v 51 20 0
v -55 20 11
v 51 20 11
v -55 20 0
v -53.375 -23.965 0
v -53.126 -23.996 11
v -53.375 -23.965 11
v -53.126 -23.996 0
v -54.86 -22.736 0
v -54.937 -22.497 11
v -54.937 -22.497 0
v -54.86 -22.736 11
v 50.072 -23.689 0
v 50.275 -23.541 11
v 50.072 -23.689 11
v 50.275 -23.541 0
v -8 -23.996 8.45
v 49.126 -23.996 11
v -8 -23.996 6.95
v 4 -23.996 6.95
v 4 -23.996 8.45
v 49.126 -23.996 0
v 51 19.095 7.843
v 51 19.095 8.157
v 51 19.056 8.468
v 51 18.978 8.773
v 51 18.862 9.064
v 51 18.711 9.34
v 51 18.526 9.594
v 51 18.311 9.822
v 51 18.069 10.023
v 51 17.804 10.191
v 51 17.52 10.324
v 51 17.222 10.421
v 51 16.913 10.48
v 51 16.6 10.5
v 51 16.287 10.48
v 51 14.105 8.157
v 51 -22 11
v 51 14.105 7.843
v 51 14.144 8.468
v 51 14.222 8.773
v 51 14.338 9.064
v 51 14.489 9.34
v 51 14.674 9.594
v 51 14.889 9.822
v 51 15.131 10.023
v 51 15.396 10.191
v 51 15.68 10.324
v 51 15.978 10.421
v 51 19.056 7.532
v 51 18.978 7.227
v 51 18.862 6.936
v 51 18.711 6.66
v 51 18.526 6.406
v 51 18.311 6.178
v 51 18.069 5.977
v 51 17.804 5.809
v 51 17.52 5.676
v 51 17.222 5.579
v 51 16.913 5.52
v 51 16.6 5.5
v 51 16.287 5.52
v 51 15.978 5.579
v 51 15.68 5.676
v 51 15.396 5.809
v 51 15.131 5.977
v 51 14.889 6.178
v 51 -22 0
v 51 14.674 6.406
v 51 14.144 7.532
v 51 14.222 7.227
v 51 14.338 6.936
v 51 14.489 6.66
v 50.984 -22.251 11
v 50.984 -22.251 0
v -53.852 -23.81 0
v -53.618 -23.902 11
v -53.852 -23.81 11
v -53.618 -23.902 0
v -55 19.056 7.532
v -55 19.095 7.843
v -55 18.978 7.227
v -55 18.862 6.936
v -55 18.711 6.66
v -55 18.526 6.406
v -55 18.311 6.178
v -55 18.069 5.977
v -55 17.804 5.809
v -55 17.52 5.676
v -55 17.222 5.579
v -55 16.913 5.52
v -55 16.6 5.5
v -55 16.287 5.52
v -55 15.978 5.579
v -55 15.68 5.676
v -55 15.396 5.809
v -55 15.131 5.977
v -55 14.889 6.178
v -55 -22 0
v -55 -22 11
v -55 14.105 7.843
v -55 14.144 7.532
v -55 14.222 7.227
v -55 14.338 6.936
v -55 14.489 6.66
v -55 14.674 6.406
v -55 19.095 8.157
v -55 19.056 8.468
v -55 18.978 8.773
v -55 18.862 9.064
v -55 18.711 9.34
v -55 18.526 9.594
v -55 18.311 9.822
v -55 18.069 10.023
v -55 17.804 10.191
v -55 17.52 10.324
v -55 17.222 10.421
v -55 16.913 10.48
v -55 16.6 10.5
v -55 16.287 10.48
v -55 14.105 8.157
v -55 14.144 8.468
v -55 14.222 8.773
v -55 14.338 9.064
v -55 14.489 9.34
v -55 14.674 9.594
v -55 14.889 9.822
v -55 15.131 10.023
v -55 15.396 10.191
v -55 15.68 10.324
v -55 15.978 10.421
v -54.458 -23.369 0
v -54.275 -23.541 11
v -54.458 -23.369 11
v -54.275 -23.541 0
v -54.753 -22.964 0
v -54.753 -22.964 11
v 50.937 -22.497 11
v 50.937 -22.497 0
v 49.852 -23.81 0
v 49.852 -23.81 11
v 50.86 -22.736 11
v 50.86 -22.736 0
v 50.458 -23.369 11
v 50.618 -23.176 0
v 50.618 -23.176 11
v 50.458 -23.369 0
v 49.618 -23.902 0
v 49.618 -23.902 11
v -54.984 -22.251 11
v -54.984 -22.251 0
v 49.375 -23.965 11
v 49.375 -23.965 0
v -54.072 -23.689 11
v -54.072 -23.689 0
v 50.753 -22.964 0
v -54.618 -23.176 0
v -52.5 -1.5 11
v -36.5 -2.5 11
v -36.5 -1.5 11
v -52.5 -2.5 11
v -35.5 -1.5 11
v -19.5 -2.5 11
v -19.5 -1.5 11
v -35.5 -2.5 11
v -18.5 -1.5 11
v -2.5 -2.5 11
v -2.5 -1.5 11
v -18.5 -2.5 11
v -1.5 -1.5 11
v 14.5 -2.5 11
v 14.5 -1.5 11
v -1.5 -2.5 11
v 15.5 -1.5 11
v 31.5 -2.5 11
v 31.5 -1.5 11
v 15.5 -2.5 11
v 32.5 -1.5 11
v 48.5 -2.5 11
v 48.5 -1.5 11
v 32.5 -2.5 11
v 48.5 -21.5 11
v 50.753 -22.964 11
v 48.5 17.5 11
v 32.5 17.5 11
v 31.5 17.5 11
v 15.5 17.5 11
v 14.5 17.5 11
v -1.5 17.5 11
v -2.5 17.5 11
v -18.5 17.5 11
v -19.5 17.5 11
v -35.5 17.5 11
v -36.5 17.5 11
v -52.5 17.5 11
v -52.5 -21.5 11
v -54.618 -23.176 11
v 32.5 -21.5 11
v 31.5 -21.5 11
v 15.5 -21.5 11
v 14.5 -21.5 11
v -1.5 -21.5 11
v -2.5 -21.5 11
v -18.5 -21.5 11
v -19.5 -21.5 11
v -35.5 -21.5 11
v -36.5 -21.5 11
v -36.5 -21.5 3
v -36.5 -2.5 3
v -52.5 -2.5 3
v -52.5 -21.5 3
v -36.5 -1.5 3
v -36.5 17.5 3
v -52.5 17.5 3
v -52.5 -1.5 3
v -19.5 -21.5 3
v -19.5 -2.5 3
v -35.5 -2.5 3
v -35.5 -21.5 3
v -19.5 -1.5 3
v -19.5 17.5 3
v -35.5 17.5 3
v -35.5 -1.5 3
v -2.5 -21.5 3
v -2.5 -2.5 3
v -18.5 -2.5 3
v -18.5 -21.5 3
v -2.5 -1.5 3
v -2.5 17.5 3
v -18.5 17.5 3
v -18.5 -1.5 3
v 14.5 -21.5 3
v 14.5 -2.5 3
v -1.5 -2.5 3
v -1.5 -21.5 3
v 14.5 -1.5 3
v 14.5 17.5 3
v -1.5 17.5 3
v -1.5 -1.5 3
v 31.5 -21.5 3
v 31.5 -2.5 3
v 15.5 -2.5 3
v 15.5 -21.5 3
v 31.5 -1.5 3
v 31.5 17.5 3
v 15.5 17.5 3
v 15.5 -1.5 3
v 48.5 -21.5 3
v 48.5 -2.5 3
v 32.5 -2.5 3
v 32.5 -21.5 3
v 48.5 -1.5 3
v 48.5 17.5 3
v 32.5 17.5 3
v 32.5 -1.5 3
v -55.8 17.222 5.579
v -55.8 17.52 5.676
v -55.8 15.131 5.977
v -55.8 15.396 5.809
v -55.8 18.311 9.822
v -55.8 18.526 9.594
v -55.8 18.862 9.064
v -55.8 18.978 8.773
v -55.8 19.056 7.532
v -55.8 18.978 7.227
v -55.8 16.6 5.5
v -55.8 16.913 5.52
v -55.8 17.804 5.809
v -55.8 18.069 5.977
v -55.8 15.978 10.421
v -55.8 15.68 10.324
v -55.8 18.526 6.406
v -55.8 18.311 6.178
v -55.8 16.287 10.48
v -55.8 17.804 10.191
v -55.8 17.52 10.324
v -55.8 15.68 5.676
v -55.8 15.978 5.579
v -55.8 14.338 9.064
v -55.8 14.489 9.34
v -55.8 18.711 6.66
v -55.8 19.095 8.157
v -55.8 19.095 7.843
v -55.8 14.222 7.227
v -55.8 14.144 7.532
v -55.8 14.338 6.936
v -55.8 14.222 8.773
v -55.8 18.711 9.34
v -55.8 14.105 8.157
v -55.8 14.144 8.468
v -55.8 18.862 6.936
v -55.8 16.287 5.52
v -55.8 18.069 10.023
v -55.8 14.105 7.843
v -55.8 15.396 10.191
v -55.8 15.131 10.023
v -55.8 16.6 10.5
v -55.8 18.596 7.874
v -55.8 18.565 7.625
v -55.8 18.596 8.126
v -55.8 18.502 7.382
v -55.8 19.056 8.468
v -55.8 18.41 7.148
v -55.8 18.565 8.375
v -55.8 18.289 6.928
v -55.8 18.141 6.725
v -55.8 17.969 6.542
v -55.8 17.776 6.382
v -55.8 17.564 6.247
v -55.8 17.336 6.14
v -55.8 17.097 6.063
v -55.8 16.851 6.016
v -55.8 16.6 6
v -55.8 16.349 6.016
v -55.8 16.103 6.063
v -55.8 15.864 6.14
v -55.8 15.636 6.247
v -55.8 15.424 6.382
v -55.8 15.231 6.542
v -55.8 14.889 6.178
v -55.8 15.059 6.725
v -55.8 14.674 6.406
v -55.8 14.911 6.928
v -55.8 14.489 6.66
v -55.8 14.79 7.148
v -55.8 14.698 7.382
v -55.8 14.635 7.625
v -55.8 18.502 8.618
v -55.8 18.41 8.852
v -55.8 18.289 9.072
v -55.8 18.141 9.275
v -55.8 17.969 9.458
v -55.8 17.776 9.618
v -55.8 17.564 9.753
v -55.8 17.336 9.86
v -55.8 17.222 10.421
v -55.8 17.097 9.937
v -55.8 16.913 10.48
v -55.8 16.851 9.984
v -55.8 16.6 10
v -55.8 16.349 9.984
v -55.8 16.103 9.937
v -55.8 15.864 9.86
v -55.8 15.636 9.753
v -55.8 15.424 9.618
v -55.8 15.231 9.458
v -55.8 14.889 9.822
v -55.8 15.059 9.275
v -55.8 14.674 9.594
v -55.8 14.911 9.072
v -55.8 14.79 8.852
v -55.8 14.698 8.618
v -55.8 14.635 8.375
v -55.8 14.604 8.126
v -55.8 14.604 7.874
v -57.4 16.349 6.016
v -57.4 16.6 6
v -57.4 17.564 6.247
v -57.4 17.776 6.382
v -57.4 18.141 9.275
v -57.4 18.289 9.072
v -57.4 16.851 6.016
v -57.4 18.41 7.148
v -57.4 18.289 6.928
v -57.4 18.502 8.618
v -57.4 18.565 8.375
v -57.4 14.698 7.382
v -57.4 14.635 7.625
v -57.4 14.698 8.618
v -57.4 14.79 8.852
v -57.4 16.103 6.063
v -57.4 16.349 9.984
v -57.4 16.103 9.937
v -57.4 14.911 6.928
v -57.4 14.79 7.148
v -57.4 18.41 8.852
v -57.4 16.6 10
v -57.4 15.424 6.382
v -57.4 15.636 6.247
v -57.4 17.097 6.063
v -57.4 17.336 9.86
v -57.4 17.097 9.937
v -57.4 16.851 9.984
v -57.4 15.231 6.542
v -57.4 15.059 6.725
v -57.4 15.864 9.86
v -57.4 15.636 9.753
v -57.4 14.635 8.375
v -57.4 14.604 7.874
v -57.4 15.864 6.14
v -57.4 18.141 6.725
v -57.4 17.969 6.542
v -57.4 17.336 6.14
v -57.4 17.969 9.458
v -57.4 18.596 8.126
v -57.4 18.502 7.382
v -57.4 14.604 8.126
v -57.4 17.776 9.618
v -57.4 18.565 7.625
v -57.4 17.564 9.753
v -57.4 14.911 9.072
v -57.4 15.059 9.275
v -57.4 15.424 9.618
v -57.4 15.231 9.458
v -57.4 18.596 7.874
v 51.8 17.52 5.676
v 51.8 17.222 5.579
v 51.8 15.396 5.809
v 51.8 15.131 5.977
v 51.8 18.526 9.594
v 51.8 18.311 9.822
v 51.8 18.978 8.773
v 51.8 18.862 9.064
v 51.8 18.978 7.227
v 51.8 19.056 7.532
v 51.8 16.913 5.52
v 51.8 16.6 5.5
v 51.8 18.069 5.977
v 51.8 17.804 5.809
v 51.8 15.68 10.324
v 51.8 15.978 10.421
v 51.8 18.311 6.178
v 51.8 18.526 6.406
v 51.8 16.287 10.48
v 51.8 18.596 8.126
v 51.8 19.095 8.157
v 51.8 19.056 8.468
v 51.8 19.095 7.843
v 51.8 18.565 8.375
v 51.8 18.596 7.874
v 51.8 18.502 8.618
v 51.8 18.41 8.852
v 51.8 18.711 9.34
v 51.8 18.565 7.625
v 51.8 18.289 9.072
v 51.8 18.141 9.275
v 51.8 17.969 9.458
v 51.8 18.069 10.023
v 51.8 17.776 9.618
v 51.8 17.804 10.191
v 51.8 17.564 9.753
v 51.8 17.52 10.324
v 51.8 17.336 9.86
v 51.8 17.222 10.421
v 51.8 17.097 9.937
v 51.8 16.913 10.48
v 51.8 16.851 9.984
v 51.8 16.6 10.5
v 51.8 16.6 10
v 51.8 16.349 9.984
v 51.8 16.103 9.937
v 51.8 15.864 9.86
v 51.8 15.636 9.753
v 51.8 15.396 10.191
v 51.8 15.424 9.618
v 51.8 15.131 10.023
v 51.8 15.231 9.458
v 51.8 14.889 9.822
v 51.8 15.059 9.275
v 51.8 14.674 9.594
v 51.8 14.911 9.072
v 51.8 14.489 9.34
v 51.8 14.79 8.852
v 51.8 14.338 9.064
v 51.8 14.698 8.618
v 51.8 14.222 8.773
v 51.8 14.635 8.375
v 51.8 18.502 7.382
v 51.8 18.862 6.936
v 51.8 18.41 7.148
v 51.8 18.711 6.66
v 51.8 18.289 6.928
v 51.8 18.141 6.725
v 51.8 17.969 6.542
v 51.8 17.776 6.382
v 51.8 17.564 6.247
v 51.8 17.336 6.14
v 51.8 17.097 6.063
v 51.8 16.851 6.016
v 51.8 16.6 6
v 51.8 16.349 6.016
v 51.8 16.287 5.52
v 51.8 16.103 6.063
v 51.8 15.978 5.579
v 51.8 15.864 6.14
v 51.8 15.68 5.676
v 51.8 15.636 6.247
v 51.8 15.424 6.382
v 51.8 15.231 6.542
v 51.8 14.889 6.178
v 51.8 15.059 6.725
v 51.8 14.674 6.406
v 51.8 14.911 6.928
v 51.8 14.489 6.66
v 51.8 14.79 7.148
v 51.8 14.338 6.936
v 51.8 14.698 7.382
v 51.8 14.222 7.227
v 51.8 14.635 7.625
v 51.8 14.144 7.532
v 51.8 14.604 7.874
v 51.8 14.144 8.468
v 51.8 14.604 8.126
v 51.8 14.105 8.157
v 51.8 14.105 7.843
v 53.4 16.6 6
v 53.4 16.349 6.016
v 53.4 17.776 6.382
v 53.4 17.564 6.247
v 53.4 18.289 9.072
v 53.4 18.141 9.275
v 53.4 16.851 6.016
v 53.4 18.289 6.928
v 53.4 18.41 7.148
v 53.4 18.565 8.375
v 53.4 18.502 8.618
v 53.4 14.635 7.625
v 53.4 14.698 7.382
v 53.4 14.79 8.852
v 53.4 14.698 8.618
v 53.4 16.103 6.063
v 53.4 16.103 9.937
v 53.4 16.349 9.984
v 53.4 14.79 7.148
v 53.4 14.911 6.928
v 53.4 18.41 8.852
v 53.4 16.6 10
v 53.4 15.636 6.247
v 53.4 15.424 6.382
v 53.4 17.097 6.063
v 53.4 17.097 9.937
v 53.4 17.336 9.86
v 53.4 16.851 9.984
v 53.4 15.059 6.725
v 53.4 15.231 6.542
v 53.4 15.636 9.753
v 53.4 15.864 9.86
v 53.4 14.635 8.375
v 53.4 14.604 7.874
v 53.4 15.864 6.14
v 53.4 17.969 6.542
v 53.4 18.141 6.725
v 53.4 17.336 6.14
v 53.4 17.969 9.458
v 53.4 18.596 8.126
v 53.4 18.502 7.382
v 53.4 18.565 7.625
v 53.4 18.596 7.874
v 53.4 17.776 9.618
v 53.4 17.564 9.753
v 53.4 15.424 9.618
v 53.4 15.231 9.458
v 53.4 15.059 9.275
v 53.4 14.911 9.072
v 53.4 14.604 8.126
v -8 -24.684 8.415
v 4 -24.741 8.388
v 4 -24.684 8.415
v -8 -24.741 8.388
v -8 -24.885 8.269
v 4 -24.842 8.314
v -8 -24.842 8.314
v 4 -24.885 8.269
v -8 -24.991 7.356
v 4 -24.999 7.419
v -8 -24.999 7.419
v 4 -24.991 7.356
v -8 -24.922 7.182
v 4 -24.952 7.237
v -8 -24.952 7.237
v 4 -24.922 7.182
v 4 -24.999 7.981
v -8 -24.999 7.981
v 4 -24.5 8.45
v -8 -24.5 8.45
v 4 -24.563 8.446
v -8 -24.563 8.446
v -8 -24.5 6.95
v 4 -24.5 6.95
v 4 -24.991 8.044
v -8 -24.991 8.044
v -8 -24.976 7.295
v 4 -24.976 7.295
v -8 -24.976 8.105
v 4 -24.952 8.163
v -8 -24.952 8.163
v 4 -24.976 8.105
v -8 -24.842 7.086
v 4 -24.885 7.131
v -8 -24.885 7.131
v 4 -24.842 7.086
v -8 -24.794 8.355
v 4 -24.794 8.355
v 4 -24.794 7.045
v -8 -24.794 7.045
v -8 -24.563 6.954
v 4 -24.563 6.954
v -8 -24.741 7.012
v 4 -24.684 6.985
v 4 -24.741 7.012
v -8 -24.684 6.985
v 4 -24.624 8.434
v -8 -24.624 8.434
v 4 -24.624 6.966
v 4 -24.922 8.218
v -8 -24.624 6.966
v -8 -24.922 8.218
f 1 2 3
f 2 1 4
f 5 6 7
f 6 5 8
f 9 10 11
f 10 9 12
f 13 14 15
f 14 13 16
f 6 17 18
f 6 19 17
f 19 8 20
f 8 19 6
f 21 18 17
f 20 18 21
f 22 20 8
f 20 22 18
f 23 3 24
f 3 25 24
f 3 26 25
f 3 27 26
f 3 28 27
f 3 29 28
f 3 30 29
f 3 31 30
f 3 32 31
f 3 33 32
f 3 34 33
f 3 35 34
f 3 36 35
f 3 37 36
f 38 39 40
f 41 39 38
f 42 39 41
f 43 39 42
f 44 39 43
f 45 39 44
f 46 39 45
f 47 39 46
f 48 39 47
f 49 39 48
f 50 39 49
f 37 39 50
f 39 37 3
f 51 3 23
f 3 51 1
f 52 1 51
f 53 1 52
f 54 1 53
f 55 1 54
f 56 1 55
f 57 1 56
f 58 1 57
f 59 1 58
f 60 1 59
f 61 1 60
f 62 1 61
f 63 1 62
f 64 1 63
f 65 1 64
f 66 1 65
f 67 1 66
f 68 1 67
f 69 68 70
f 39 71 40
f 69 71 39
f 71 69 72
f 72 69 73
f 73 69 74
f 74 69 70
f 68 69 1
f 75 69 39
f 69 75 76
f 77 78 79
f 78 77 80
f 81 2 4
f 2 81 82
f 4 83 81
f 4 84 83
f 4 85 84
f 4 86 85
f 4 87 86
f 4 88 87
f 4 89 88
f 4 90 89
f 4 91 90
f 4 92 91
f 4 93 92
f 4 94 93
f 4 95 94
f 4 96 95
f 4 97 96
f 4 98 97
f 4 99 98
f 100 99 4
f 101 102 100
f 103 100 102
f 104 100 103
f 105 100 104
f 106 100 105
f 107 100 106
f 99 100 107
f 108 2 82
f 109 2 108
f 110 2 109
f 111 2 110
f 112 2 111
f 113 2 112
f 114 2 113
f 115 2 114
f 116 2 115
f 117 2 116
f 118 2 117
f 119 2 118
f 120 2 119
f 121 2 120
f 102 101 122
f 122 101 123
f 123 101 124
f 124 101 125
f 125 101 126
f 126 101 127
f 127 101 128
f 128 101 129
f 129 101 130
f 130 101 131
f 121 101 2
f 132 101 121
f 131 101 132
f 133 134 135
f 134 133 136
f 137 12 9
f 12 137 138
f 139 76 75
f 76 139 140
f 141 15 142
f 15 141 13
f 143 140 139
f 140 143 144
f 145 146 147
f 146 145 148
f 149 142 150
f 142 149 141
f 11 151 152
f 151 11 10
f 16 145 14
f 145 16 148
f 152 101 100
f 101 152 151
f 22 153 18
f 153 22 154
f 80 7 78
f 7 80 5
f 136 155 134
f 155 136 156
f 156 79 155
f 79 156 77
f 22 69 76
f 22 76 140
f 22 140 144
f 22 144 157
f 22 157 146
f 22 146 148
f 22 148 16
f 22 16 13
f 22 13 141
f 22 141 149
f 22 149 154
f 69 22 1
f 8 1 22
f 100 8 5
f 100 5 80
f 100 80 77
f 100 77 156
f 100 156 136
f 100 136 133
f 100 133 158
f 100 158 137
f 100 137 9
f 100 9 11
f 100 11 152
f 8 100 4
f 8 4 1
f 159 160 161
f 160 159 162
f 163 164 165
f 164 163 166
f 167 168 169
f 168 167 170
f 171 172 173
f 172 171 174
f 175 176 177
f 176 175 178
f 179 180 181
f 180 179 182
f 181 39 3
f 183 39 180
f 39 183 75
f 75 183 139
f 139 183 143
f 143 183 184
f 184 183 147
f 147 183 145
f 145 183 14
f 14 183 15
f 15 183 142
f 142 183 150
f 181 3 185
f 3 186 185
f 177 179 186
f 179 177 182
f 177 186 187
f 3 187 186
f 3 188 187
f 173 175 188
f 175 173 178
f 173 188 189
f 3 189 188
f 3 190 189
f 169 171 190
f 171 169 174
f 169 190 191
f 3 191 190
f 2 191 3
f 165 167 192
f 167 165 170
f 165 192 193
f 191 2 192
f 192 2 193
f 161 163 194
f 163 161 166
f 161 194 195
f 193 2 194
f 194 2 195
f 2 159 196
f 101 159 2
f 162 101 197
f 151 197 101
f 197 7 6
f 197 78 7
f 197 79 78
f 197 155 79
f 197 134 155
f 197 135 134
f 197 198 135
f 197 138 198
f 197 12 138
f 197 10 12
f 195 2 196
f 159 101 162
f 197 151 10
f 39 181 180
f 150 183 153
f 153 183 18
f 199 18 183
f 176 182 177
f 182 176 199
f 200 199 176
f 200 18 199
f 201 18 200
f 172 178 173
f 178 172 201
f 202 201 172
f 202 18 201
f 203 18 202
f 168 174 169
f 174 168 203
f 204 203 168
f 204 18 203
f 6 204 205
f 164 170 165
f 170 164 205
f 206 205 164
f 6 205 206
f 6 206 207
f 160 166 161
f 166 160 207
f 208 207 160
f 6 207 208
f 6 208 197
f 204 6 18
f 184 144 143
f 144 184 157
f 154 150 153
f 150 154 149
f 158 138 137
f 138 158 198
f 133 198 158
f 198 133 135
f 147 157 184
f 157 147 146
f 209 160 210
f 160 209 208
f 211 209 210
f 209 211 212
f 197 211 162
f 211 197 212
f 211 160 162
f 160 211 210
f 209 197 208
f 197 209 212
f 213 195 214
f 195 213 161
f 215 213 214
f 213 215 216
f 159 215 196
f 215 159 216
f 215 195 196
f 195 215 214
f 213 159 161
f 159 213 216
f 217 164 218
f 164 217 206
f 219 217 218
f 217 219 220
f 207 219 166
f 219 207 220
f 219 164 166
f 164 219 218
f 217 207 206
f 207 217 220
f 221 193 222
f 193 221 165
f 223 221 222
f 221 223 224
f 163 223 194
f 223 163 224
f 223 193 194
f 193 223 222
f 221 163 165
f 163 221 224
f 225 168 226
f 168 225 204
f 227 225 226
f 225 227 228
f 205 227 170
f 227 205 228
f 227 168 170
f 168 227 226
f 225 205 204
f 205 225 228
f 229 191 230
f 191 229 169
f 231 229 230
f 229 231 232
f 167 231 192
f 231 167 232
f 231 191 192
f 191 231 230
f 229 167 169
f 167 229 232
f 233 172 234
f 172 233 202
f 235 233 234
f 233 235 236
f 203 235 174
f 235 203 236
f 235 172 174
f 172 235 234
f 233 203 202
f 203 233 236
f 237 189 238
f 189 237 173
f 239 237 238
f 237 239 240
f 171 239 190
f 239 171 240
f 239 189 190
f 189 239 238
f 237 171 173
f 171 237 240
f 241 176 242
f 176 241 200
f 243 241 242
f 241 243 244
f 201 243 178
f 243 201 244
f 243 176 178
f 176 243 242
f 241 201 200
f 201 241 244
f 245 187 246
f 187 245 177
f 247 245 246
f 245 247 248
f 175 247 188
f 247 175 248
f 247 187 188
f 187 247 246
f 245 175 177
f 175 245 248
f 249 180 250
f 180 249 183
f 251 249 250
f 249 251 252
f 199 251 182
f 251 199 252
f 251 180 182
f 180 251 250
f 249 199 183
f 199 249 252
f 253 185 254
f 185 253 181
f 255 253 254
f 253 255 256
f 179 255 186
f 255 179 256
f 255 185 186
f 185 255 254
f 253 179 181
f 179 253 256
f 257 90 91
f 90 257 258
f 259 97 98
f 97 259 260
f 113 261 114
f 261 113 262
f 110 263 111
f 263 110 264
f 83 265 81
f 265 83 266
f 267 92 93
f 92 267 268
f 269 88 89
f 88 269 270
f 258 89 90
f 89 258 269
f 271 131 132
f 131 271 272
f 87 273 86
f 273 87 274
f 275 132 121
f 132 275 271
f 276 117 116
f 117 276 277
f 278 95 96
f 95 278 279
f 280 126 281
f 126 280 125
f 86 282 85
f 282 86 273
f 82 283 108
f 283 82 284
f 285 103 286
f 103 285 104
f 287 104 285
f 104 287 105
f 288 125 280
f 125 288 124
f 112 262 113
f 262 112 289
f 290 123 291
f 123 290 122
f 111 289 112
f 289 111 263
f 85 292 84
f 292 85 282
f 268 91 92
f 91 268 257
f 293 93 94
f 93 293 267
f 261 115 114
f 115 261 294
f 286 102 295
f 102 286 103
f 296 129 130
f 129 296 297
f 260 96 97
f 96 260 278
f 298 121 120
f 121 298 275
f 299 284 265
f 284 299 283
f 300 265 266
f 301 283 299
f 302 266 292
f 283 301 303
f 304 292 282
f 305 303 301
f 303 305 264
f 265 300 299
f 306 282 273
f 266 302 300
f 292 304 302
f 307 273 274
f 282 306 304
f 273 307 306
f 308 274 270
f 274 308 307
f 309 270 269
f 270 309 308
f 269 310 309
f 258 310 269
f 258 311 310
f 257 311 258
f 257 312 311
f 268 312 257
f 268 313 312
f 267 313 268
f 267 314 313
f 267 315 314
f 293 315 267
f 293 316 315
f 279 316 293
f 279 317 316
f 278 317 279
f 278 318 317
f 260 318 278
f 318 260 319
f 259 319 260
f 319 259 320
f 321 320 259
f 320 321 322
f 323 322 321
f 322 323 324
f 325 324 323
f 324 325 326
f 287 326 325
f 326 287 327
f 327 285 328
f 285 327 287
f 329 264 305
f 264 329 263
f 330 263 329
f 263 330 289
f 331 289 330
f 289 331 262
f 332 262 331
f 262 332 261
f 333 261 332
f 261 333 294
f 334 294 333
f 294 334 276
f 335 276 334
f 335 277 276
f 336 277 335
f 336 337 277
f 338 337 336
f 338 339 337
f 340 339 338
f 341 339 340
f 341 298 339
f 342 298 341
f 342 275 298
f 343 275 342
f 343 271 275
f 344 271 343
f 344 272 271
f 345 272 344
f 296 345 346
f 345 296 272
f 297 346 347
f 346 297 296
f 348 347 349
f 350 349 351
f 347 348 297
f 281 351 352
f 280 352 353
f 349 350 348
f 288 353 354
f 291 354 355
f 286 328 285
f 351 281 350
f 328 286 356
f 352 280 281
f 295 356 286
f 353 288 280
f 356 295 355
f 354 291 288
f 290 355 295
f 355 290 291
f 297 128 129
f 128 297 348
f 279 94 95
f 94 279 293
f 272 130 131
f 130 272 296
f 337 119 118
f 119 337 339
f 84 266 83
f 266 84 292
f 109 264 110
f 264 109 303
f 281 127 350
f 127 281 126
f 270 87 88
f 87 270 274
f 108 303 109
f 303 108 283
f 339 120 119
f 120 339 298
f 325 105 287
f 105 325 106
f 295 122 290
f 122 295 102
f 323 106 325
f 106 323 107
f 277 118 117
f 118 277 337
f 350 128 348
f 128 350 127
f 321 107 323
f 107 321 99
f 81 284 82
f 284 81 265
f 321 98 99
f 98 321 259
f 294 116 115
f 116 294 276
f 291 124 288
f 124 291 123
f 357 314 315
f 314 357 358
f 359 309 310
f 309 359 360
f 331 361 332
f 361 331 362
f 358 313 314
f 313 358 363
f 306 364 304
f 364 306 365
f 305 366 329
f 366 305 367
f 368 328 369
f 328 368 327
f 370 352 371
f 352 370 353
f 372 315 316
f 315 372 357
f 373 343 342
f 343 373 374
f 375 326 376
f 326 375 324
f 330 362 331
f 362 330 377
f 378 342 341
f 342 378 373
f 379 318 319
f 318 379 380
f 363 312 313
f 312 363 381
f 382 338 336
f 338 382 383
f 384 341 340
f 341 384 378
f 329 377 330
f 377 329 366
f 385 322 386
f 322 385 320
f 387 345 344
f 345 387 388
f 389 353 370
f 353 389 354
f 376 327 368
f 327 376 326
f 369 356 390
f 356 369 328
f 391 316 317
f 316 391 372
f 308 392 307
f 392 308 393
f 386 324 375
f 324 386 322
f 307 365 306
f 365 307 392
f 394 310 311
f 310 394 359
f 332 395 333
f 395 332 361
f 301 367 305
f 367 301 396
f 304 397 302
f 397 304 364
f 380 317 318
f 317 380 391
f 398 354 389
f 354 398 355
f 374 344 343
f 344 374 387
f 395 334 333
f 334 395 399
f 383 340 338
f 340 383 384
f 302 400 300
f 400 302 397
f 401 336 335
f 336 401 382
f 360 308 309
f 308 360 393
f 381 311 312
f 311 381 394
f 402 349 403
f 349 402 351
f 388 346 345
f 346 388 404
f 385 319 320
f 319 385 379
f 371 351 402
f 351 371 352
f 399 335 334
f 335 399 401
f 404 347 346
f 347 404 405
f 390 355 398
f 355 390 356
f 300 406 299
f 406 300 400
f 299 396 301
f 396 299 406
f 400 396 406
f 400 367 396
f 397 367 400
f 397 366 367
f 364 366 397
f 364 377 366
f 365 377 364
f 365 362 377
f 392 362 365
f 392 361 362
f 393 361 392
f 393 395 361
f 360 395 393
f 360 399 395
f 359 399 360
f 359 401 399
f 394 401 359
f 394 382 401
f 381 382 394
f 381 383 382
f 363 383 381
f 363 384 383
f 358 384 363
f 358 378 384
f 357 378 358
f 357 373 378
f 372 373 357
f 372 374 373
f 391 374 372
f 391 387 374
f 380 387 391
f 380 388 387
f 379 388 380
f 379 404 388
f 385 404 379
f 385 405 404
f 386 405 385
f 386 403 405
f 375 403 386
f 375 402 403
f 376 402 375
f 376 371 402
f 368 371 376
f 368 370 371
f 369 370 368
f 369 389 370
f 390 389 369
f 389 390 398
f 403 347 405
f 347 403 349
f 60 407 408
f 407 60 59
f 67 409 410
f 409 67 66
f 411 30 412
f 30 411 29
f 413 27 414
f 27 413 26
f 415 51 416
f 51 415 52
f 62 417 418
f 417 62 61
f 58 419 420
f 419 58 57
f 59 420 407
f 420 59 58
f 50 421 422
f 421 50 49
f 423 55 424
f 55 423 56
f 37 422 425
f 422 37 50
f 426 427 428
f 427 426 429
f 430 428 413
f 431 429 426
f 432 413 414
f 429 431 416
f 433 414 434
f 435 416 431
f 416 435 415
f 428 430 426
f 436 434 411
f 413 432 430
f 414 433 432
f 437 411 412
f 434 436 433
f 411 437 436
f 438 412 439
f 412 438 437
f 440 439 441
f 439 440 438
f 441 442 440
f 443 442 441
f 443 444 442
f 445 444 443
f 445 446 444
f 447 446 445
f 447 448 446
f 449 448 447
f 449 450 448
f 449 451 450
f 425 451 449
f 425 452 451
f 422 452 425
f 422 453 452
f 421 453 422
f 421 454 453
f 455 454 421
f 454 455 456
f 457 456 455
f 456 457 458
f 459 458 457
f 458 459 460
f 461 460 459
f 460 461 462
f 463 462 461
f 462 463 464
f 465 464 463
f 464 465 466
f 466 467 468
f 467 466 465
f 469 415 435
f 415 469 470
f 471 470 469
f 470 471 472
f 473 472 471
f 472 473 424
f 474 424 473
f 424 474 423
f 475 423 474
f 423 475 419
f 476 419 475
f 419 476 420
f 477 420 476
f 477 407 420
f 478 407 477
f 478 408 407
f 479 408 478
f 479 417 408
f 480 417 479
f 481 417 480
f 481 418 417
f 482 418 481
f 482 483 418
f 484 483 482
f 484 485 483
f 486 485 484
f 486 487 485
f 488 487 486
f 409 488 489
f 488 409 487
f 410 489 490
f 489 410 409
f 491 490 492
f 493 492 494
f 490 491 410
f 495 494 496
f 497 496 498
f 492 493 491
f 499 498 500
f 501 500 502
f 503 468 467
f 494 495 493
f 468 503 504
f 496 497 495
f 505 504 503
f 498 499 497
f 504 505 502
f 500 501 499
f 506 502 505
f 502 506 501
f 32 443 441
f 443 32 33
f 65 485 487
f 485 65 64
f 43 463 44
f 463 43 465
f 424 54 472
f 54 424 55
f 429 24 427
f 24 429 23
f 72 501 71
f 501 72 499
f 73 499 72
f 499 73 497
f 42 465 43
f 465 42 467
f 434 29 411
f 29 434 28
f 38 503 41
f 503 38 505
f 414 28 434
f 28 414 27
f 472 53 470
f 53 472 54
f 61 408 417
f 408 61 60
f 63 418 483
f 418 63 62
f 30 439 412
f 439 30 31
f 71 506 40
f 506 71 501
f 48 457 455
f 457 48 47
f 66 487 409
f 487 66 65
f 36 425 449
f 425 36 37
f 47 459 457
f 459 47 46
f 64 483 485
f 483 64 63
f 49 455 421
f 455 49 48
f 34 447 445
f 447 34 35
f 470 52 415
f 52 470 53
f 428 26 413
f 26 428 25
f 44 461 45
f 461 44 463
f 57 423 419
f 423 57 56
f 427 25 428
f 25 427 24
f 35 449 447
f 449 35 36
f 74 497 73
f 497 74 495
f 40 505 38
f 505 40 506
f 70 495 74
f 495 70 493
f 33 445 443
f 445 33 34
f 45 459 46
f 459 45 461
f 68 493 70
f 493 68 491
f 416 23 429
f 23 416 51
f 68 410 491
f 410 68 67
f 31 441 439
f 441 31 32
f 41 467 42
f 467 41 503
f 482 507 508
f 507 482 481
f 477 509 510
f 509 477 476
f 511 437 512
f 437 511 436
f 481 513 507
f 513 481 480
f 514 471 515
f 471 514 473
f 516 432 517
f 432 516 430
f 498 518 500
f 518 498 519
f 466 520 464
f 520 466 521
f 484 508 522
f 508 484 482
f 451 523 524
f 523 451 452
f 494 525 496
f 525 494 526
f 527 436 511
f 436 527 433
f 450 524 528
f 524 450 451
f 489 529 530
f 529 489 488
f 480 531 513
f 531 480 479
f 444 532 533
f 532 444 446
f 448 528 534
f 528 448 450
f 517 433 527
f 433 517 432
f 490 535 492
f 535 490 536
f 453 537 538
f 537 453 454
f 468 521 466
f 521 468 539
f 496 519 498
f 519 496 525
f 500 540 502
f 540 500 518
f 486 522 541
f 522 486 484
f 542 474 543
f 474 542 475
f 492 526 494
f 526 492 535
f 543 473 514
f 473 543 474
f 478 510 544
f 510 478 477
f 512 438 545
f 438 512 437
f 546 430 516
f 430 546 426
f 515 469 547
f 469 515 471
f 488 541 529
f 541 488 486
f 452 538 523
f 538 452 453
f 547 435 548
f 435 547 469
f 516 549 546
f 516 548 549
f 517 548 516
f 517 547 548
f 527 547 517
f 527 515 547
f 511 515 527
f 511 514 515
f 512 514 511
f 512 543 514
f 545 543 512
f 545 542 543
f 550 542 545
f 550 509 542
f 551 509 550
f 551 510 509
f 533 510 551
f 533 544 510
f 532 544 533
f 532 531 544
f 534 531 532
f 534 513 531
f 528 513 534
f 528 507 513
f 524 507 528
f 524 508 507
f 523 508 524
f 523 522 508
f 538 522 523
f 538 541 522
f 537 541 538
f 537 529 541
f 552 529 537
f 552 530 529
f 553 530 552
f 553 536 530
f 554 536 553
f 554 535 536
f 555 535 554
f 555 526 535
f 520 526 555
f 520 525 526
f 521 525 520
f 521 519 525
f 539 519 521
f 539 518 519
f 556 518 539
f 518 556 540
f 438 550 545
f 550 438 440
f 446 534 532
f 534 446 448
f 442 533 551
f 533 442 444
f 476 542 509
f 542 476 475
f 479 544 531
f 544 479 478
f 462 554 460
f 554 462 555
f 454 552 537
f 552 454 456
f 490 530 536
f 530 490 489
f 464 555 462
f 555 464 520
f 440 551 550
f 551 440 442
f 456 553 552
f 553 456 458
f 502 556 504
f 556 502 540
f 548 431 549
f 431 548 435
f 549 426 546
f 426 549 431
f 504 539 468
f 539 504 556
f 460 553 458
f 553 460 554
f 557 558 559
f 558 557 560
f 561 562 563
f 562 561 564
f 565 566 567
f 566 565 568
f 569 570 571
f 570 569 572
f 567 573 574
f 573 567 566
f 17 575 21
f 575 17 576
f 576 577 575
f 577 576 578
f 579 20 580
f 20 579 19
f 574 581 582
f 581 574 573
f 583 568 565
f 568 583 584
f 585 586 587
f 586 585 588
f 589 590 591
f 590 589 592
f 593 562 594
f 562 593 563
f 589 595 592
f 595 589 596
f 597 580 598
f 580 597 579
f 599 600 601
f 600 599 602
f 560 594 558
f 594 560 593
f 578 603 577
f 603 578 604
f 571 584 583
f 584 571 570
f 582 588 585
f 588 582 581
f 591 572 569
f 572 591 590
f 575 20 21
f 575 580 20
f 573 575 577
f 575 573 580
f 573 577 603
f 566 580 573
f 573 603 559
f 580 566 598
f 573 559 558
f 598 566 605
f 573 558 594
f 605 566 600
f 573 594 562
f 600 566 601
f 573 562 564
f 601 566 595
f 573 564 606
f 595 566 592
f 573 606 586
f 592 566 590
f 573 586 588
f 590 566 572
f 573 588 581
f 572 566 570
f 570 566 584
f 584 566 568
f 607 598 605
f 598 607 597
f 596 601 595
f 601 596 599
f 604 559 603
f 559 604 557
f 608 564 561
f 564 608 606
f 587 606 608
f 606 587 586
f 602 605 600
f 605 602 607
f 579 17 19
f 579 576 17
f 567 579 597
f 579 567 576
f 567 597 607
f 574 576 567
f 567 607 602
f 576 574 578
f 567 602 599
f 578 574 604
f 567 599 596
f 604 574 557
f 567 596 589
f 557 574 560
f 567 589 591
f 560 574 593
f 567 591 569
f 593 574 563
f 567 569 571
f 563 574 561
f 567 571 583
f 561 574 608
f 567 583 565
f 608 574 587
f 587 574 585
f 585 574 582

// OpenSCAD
// file: ../BOSL2/std.scad
// Minimal BOSL2 compatibility shim for bundled gallery models.
// It implements only the helpers used by the imported OpenSCAD projects.

CENTER = [0, 0, 0];
BOTTOM = [0, 0, -1];
TOP = [0, 0, 1];
LEFT = [-1, 0, 0];
RIGHT = [1, 0, 0];
FRONT = [0, -1, 0];
BACK = [0, 1, 0];

module up(z=0) {
    translate([0, 0, z]) children();
}

module down(z=0) {
    translate([0, 0, -z]) children();
}

module attach(anchor=CENTER) {
    children();
}

module cuboid(size=[1, 1, 1], anchor=CENTER) {
    center = anchor == CENTER;
    translate(center ? [0, 0, 0] : [0, 0, size[2] / 2])
        cube(size, center=true);
    children();
}

module xcyl(h=1, r=1, anchor=CENTER) {
    center = anchor == CENTER;
    translate(center ? [0, 0, 0] : [h / 2, 0, 0])
        rotate([0, 90, 0])
            cylinder(h=h, r=r, center=true);
}
// main file
include <../BOSL2/std.scad>

/* [Box Variables] */
// items shown
itemsShown="both"; // [both,box,lid]
// the amount of pan rows in a column
panRows = 6; // [1:1:20]
// the amount of colums for the whole box
panColumns = 2;// [1:1:20]

/* [Pan Sizes] */
// the width of a single pan in cm
panWidth = 16.0;
// the length of a single pan in cm
panLength = 19.0;
// the height of a single pan in cm
panHeight = 8.2;

/* [Clip Variables] */
// the width of the close clip
clipWidth = 12.0;
// the length of the close clip
clipLen = 0.5;
// the height of the close clip
clipHeight = 1.5;

/* [Others] */
// the width of the outer border
borderWidth = 2;

width = panWidth+1;
length = panLength+1;
height = panHeight+2.8;
lengthWithoutBorders = length*panColumns;
totalLength = (length*panColumns)+(borderWidth*2);
totalWidth = (width*panRows)+(borderWidth*2);

module panHolder() {
    outerPanCube = [width, length, height];
    insidePanCube = [panWidth, panLength, panHeight];
    for(i = [0:panRows - 1]) {
        for(b = [0:panColumns -1]) {
            translate([i * width, b * length, 0]) union() {
            difference() {
                cube(outerPanCube);
                translate([(length-panLength)/2,(width-panWidth)/2,3]) cube(insidePanCube);
            };
            }
        }
    }
}

module outerCasing() {
    translate([-borderWidth,-borderWidth,0]) difference() {
        hull() {
            cubeSize = borderWidth*2;
            translate ([0, length*panColumns, 0]) cube([cubeSize,cubeSize,height]);
            translate ([width*panRows, length*panColumns, 0]) cube([cubeSize,cubeSize,height]);
            translate ([borderWidth, borderWidth, 0]) cylinder (height, borderWidth, borderWidth, $fn=50);
            translate ([totalWidth-borderWidth, borderWidth, 0]) cylinder (height, borderWidth, borderWidth, $fn=50);
        }
        translate([borderWidth,borderWidth,0]) cube([(width*panRows), (length*panColumns), height+1]);
    }
}

module lid() {
    lidHeight = 9;
    lidWidth = totalWidth+3.6;
    lidBorder = borderWidth+1;
    lidLen = totalLength +2;
    
    difference() {
        translate([-lidBorder,-lidBorder,height-4.3])
        cuboid(
            [lidWidth, lidLen, lidHeight], rounding=2,
            edges=[FWD+RIGHT, FWD+LEFT],
            $fn=50
        );
        translate([-lidBorder,-lidBorder+0.7,height-7])
        cuboid(
            [lidWidth-2, lidLen, lidHeight+2], rounding=2,
            edges=[FWD+RIGHT, FWD+LEFT],
            $fn=50
        );
    }

    for (i = [1:1:panColumns-1]) {
        support = [-(lidWidth/2)-lidBorder, -(totalLength/2)+(length*i), panHeight];
        translate(support)
        cube([lidWidth, 1, 1]);
    }
}

module hingeLeft() {
    spacingBack = 1.4;
    cylRadius1 = 0.8;
    positionZ = panHeight-0.2;
    translate([(borderWidth*-1)-cylRadius1,(length*panColumns)-spacingBack,positionZ]) 
    rotate([0,90,0]) 
    cylinder(cylRadius1, 2.5, 2.5, $fn=50, false);

    cylRadius2 = cylRadius1*2;
    translate([(borderWidth*-1)-cylRadius1-cylRadius2,(length*panColumns)-spacingBack,positionZ]) 
    rotate([0,90,0]) 
    cylinder(cylRadius2, 2, 2, $fn=50, false);
}

module hingeRight() {
    spacingBack = 1.4;
    positionZ = panHeight-0.2;
    cylRadius1 = 0.8;
    translate([((width*panRows)+borderWidth),(length*panColumns)-spacingBack, positionZ]) 
    rotate([0,90,0]) 
    cylinder(cylRadius1, 2.5, 2.5, $fn=50, false);

    cylRadius2 = cylRadius1*2;
    translate([((width*panRows)+borderWidth+cylRadius1),(length*panColumns)-spacingBack, positionZ]) 
    rotate([0,90,0]) 
    cylinder(cylRadius2, 2, 2, $fn=50, false);
}

module clip(clipWidth = clipWidth, clipLen = clipLen, clipHeight = clipHeight) {
    rotate([0,90,0])
    hull() {
        cube([clipHeight,clipLen,clipWidth]);
        translate([clipLen,-clipLen,0]) cylinder(clipWidth, clipLen, clipLen, $fn=50, false);
        translate([clipHeight-clipLen, -clipLen,0]) cylinder(clipWidth, clipLen, clipLen, $fn=50, false);
    }
}

module completeLid() {
    union() {
        right(1)
        up(2)
        // difference() {
            lid();
            color("Red")
            back(lengthWithoutBorders/2)
            // back(totalWidth/2-9.5)
            up(height-3)
            left((totalWidth+12)/2)
            rotate([0,90,0]) 
            cylinder(totalWidth+12, 2.2, 2.2, $fn=50, false);
        // }
        rot(180)
        left((clipWidth/2)-2)
        up(height - 4.5)
        back((totalLength/2)+3)
        clip();

        rot(180)
        left(-2)
        up(height - 2.5)
        back((totalLength/2)+5)
        cuboid(
            [30, 3, 3], rounding=2,
            edges=[BACK+RIGHT, BACK+LEFT],
            $fn=50
        );
    }
}

if (itemsShown == "both" || itemsShown == "box") {
    translate([-(totalWidth/2), -(totalLength/2),0]) 
    union() {
        translate([(totalWidth/2)-(clipWidth/2)-borderWidth, -borderWidth, height - 2.55]) clip();
        outerCasing();
        panHolder();
        hingeLeft();
        hingeRight();
    }
}

if (itemsShown == "both" || itemsShown == "lid") {
    union() {
        // yrot(180)
        // back(totalLength+borderWidth+4)
        // down(height+2.2)
        // right(borderWidth*2)
       // completeLid();
    }
}
